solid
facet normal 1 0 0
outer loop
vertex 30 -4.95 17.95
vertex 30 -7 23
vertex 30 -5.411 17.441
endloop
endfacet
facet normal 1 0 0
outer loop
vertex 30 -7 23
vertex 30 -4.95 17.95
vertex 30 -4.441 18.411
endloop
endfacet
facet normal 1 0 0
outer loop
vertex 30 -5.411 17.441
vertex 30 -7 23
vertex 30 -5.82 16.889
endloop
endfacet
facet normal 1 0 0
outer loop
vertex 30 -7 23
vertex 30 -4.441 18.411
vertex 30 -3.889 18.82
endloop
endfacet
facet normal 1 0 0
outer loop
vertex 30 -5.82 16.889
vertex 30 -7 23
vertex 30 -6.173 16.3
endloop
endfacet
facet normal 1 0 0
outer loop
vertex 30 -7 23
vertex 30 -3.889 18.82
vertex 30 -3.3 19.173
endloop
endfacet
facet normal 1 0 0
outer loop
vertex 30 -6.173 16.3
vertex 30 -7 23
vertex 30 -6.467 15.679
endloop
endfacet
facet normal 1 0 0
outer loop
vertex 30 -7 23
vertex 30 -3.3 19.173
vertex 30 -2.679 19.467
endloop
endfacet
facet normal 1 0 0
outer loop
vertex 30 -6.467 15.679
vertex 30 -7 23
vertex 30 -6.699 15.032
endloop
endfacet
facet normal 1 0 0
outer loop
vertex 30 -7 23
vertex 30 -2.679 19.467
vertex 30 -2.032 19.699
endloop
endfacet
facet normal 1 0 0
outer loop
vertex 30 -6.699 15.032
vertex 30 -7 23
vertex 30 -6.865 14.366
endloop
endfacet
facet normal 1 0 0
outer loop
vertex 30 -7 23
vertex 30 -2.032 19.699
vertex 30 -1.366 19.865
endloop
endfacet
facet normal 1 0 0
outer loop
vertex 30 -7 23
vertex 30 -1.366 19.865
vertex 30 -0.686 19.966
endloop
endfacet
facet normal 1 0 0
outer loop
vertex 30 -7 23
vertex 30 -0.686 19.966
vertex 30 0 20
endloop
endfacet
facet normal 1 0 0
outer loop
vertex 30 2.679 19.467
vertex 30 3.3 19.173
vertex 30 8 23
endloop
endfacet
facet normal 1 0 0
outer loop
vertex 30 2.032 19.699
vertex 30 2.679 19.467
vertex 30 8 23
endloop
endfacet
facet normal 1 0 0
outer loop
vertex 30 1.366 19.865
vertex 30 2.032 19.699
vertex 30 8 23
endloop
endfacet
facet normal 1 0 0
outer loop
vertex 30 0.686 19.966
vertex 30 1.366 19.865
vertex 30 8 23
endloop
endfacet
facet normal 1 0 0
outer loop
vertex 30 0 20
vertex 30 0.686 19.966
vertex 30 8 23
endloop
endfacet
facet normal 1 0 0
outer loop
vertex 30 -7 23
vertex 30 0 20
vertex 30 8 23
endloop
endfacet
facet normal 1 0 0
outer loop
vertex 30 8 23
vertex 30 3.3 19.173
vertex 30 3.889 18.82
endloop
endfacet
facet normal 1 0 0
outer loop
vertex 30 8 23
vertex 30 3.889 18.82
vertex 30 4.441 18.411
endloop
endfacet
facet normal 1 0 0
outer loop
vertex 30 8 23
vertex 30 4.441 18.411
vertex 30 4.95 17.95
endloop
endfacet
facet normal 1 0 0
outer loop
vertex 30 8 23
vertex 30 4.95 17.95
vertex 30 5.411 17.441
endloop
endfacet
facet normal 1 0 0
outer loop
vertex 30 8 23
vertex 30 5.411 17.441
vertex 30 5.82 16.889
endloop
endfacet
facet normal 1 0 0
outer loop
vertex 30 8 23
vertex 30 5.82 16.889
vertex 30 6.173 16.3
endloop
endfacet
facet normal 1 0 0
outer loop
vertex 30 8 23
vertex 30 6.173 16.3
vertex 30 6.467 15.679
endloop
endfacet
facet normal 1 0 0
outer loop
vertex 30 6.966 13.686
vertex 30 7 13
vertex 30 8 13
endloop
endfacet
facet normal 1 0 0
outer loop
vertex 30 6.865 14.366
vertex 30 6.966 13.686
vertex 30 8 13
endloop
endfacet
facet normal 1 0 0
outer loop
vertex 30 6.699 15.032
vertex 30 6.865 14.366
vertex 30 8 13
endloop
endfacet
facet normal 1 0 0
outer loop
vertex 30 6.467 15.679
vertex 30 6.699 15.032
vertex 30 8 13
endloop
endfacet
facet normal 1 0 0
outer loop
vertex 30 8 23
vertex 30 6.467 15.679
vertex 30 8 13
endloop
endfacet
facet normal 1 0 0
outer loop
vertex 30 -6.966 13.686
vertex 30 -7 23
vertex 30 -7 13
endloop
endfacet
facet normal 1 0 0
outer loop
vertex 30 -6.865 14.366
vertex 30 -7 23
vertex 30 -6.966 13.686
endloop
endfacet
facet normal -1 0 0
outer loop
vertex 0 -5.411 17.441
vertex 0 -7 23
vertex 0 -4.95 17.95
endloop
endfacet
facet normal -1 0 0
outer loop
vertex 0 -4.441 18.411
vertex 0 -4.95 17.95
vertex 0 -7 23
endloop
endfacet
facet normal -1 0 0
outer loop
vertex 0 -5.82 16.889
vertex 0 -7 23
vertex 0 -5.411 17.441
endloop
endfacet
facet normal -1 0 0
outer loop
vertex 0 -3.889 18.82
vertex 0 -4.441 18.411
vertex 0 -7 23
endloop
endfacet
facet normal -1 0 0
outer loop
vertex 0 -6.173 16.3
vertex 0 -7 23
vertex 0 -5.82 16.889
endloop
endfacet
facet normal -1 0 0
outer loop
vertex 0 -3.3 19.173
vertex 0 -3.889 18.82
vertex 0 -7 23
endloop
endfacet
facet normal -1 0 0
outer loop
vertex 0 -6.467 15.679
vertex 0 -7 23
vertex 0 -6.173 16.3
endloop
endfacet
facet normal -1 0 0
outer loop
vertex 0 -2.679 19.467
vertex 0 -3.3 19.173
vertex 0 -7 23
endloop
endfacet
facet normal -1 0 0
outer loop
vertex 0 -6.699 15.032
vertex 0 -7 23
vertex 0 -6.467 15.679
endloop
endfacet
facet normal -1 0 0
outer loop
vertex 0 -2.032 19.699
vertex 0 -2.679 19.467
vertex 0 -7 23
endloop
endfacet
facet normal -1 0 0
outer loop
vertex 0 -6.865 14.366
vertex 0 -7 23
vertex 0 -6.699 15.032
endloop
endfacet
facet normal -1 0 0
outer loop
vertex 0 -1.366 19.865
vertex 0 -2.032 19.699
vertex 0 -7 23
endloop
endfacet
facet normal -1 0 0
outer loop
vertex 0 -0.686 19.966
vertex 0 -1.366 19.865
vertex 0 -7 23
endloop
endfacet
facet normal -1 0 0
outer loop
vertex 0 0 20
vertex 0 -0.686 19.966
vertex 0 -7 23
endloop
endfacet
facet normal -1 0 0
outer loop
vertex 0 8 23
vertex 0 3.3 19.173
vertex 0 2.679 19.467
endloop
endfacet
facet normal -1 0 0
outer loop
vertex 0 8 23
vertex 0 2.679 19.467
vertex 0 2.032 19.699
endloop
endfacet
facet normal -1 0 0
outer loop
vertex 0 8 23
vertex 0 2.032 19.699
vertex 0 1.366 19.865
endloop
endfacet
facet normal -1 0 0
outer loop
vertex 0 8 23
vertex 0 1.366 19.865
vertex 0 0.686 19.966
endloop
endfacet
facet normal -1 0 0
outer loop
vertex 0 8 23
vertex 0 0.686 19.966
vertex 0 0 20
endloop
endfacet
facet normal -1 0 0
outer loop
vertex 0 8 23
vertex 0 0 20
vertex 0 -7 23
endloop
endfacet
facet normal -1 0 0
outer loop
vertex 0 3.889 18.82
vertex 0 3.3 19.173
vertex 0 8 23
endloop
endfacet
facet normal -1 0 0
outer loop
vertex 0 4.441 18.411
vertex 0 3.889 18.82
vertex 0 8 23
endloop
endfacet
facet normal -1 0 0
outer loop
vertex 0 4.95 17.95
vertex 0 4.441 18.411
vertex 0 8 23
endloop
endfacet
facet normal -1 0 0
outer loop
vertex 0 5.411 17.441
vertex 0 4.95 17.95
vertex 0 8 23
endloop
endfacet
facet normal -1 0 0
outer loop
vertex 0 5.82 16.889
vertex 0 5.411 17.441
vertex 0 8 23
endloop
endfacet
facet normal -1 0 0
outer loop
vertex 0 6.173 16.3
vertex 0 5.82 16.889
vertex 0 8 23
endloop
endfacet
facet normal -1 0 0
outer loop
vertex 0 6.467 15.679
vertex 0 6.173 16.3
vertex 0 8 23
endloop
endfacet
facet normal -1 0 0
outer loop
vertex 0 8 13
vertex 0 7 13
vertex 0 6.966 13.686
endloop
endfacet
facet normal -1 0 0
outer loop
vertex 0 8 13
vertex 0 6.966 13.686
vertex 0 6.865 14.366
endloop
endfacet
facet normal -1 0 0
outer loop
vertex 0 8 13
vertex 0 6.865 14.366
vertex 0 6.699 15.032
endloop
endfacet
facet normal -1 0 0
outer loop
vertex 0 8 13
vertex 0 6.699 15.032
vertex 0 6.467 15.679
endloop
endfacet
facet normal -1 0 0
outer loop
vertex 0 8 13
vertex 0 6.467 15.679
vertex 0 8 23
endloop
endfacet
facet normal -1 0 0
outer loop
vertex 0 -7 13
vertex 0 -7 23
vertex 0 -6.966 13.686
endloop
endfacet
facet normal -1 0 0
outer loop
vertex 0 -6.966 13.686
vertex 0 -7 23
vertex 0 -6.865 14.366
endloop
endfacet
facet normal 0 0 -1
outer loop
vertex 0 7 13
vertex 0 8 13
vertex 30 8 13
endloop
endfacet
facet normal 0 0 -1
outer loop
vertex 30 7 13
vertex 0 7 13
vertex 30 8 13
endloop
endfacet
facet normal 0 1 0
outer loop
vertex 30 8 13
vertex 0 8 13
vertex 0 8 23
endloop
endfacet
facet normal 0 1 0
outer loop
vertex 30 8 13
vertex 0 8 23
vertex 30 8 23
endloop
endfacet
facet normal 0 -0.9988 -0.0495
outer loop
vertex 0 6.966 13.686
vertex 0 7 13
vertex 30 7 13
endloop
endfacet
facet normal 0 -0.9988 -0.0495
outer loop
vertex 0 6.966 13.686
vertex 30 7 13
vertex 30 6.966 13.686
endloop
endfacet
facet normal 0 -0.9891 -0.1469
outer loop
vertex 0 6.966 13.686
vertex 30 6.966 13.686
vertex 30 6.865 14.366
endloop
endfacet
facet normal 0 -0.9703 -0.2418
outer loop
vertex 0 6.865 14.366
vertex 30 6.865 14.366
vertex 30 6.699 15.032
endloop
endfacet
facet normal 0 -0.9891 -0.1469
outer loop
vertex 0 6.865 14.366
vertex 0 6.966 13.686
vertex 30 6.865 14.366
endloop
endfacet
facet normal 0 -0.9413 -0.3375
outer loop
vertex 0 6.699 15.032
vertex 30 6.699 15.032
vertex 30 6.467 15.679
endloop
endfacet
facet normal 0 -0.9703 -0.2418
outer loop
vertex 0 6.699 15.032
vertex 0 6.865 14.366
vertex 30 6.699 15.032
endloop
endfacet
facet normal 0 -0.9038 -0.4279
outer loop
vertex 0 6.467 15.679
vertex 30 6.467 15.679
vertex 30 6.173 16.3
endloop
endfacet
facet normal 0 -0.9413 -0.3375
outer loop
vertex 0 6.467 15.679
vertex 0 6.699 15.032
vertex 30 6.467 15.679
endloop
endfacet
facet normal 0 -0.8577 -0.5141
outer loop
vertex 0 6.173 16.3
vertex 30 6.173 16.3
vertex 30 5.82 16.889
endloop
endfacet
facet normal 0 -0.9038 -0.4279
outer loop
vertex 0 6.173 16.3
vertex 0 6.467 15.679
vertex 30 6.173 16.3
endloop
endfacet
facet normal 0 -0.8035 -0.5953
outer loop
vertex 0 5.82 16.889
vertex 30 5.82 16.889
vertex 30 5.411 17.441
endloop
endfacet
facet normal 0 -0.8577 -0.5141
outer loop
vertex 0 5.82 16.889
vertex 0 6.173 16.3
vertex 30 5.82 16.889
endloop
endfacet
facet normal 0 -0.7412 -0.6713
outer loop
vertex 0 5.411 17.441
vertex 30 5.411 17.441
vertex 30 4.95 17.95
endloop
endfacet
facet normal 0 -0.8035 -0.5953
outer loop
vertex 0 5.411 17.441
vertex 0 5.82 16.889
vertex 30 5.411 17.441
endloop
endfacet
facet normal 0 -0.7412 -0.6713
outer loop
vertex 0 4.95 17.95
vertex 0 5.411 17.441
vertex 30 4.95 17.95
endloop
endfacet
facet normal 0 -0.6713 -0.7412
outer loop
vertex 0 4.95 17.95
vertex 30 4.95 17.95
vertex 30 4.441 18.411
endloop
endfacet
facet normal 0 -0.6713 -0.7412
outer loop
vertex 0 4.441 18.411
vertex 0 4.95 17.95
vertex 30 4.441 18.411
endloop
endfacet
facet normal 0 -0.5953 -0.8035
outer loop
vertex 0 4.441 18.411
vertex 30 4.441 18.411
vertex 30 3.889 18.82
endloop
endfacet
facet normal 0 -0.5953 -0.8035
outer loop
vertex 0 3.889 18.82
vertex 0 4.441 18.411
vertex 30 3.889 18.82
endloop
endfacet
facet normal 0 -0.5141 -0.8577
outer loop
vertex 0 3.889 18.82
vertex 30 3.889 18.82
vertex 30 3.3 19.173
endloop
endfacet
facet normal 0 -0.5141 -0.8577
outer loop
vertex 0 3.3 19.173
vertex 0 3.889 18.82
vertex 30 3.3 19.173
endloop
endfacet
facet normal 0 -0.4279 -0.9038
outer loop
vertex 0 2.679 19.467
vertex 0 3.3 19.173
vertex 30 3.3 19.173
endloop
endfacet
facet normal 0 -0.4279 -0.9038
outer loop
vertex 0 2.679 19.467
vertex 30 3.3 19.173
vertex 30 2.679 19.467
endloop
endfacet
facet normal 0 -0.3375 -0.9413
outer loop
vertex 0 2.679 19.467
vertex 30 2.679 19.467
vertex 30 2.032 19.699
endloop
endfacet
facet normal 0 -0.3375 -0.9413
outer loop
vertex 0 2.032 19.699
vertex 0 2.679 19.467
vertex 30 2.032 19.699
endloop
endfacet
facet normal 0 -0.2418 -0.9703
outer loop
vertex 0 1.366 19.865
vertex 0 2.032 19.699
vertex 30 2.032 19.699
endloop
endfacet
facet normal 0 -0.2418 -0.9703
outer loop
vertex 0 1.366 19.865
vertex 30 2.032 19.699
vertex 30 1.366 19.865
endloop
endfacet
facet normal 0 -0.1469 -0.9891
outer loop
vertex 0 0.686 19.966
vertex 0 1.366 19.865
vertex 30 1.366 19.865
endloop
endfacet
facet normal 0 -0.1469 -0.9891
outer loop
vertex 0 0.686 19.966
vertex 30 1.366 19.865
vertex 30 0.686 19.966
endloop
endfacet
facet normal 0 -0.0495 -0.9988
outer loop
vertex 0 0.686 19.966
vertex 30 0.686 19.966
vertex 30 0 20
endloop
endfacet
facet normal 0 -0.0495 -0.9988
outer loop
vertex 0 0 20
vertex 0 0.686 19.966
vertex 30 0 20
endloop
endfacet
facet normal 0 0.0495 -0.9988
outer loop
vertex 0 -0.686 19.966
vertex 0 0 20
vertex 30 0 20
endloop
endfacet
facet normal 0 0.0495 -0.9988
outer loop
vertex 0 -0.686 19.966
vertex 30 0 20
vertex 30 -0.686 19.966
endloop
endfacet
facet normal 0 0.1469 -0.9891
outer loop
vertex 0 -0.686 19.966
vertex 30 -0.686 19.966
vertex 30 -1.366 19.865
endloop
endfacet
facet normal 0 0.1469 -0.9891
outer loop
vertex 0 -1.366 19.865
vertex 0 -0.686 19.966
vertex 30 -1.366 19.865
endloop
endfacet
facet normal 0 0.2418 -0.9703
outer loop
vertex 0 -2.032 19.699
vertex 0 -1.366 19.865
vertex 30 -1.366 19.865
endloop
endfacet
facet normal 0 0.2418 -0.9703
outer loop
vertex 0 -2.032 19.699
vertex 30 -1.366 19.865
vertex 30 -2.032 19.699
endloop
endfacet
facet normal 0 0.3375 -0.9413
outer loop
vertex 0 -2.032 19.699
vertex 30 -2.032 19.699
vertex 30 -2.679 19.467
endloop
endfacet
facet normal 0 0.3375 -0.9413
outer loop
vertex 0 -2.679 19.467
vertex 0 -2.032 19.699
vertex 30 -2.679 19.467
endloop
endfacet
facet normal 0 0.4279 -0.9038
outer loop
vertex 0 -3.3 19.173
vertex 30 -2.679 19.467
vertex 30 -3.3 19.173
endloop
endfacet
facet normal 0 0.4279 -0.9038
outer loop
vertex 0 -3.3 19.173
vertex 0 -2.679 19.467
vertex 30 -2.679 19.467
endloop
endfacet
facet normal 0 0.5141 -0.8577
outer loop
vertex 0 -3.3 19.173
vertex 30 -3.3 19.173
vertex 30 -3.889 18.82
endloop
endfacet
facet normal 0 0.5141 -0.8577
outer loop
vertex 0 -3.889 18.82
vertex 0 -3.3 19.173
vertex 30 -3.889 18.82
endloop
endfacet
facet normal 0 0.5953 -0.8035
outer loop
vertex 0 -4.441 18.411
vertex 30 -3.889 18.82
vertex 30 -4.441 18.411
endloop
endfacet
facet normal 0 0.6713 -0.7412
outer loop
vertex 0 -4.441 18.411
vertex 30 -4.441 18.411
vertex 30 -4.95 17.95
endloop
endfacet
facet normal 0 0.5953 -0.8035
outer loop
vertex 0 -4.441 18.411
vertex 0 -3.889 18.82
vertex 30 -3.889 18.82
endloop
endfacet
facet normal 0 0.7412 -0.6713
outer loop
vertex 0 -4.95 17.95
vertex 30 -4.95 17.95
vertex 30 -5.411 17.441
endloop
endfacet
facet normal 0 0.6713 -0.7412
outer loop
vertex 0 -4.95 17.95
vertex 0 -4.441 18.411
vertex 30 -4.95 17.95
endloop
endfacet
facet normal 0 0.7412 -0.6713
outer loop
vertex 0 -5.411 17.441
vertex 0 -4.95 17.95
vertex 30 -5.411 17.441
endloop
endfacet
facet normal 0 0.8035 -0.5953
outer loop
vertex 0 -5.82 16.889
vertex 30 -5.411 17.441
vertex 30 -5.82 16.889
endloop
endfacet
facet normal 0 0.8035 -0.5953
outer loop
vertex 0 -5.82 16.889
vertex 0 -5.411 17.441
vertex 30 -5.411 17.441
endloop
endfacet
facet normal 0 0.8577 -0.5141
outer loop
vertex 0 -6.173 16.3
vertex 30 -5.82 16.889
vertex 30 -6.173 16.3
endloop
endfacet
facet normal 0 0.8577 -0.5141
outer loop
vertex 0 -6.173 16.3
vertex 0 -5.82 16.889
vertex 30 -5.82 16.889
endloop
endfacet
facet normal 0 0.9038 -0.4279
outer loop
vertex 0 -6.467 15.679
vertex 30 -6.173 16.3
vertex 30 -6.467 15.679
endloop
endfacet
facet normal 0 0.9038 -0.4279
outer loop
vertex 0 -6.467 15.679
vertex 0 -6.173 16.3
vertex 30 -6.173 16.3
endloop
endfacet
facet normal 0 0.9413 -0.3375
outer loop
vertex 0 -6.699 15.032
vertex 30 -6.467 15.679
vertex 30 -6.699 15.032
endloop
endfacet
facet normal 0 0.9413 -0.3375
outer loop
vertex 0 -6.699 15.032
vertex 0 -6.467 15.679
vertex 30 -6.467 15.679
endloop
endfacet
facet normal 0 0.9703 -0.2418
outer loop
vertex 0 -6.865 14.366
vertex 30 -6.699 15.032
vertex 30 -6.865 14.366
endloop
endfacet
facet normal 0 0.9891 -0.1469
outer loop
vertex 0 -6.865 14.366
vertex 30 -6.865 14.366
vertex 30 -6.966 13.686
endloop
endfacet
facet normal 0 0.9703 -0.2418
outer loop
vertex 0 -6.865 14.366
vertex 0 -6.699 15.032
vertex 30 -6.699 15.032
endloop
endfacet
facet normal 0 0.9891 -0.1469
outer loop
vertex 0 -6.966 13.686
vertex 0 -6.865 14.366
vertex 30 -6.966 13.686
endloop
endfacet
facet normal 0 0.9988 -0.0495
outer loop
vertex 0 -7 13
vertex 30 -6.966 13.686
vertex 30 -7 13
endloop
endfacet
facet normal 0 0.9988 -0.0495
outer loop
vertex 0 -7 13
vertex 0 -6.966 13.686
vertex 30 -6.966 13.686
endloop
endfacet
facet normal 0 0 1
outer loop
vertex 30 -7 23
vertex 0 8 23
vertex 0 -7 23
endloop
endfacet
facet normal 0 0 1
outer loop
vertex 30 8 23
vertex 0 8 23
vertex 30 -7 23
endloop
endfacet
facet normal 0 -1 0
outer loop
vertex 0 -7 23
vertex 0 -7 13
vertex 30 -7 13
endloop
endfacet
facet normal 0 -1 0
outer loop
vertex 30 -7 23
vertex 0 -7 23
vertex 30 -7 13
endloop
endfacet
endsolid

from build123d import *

# Parameters (mm, degrees)
CYLINDER018_R           = 7
CYLINDER018_DEPTH       = 30
CYLINDER018_PITCH_ANGLE = 90
BOX003_W                = 30
BOX003_H                = 15
BOX003_DEPTH            = 10


with BuildPart() as cylinder018:
    # Cylinder018 → Cylinder018 (new body)
    with BuildSketch(Plane.XY):
        Circle(CYLINDER018_R)
    extrude(amount=CYLINDER018_DEPTH)


with BuildPart() as cylinder018_1:
    # Cylinder018 pitch: moved
    add(cylinder018.part.rotate(Axis((0, 0, 0), (0, 1, 0)), CYLINDER018_PITCH_ANGLE))


with BuildPart() as cylinder018_2:
    # Cylinder018 placement: moved
    add(cylinder018_1.part.moved(Location((0, 0, 13))))


with BuildPart() as cut013:
    # Box003 → Box003 (new body)
    with BuildSketch(Plane(origin=(0, -7, 13), x_dir=(1, 0, 0), z_dir=(0, 0, 1))):
        with Locations((15, 7.5)):
            Rectangle(BOX003_W, BOX003_H)
    extrude(amount=BOX003_DEPTH)

    # Cut013: cut Cylinder018
    add(cylinder018_2.part, mode=Mode.SUBTRACT)


solid = cut013.part
